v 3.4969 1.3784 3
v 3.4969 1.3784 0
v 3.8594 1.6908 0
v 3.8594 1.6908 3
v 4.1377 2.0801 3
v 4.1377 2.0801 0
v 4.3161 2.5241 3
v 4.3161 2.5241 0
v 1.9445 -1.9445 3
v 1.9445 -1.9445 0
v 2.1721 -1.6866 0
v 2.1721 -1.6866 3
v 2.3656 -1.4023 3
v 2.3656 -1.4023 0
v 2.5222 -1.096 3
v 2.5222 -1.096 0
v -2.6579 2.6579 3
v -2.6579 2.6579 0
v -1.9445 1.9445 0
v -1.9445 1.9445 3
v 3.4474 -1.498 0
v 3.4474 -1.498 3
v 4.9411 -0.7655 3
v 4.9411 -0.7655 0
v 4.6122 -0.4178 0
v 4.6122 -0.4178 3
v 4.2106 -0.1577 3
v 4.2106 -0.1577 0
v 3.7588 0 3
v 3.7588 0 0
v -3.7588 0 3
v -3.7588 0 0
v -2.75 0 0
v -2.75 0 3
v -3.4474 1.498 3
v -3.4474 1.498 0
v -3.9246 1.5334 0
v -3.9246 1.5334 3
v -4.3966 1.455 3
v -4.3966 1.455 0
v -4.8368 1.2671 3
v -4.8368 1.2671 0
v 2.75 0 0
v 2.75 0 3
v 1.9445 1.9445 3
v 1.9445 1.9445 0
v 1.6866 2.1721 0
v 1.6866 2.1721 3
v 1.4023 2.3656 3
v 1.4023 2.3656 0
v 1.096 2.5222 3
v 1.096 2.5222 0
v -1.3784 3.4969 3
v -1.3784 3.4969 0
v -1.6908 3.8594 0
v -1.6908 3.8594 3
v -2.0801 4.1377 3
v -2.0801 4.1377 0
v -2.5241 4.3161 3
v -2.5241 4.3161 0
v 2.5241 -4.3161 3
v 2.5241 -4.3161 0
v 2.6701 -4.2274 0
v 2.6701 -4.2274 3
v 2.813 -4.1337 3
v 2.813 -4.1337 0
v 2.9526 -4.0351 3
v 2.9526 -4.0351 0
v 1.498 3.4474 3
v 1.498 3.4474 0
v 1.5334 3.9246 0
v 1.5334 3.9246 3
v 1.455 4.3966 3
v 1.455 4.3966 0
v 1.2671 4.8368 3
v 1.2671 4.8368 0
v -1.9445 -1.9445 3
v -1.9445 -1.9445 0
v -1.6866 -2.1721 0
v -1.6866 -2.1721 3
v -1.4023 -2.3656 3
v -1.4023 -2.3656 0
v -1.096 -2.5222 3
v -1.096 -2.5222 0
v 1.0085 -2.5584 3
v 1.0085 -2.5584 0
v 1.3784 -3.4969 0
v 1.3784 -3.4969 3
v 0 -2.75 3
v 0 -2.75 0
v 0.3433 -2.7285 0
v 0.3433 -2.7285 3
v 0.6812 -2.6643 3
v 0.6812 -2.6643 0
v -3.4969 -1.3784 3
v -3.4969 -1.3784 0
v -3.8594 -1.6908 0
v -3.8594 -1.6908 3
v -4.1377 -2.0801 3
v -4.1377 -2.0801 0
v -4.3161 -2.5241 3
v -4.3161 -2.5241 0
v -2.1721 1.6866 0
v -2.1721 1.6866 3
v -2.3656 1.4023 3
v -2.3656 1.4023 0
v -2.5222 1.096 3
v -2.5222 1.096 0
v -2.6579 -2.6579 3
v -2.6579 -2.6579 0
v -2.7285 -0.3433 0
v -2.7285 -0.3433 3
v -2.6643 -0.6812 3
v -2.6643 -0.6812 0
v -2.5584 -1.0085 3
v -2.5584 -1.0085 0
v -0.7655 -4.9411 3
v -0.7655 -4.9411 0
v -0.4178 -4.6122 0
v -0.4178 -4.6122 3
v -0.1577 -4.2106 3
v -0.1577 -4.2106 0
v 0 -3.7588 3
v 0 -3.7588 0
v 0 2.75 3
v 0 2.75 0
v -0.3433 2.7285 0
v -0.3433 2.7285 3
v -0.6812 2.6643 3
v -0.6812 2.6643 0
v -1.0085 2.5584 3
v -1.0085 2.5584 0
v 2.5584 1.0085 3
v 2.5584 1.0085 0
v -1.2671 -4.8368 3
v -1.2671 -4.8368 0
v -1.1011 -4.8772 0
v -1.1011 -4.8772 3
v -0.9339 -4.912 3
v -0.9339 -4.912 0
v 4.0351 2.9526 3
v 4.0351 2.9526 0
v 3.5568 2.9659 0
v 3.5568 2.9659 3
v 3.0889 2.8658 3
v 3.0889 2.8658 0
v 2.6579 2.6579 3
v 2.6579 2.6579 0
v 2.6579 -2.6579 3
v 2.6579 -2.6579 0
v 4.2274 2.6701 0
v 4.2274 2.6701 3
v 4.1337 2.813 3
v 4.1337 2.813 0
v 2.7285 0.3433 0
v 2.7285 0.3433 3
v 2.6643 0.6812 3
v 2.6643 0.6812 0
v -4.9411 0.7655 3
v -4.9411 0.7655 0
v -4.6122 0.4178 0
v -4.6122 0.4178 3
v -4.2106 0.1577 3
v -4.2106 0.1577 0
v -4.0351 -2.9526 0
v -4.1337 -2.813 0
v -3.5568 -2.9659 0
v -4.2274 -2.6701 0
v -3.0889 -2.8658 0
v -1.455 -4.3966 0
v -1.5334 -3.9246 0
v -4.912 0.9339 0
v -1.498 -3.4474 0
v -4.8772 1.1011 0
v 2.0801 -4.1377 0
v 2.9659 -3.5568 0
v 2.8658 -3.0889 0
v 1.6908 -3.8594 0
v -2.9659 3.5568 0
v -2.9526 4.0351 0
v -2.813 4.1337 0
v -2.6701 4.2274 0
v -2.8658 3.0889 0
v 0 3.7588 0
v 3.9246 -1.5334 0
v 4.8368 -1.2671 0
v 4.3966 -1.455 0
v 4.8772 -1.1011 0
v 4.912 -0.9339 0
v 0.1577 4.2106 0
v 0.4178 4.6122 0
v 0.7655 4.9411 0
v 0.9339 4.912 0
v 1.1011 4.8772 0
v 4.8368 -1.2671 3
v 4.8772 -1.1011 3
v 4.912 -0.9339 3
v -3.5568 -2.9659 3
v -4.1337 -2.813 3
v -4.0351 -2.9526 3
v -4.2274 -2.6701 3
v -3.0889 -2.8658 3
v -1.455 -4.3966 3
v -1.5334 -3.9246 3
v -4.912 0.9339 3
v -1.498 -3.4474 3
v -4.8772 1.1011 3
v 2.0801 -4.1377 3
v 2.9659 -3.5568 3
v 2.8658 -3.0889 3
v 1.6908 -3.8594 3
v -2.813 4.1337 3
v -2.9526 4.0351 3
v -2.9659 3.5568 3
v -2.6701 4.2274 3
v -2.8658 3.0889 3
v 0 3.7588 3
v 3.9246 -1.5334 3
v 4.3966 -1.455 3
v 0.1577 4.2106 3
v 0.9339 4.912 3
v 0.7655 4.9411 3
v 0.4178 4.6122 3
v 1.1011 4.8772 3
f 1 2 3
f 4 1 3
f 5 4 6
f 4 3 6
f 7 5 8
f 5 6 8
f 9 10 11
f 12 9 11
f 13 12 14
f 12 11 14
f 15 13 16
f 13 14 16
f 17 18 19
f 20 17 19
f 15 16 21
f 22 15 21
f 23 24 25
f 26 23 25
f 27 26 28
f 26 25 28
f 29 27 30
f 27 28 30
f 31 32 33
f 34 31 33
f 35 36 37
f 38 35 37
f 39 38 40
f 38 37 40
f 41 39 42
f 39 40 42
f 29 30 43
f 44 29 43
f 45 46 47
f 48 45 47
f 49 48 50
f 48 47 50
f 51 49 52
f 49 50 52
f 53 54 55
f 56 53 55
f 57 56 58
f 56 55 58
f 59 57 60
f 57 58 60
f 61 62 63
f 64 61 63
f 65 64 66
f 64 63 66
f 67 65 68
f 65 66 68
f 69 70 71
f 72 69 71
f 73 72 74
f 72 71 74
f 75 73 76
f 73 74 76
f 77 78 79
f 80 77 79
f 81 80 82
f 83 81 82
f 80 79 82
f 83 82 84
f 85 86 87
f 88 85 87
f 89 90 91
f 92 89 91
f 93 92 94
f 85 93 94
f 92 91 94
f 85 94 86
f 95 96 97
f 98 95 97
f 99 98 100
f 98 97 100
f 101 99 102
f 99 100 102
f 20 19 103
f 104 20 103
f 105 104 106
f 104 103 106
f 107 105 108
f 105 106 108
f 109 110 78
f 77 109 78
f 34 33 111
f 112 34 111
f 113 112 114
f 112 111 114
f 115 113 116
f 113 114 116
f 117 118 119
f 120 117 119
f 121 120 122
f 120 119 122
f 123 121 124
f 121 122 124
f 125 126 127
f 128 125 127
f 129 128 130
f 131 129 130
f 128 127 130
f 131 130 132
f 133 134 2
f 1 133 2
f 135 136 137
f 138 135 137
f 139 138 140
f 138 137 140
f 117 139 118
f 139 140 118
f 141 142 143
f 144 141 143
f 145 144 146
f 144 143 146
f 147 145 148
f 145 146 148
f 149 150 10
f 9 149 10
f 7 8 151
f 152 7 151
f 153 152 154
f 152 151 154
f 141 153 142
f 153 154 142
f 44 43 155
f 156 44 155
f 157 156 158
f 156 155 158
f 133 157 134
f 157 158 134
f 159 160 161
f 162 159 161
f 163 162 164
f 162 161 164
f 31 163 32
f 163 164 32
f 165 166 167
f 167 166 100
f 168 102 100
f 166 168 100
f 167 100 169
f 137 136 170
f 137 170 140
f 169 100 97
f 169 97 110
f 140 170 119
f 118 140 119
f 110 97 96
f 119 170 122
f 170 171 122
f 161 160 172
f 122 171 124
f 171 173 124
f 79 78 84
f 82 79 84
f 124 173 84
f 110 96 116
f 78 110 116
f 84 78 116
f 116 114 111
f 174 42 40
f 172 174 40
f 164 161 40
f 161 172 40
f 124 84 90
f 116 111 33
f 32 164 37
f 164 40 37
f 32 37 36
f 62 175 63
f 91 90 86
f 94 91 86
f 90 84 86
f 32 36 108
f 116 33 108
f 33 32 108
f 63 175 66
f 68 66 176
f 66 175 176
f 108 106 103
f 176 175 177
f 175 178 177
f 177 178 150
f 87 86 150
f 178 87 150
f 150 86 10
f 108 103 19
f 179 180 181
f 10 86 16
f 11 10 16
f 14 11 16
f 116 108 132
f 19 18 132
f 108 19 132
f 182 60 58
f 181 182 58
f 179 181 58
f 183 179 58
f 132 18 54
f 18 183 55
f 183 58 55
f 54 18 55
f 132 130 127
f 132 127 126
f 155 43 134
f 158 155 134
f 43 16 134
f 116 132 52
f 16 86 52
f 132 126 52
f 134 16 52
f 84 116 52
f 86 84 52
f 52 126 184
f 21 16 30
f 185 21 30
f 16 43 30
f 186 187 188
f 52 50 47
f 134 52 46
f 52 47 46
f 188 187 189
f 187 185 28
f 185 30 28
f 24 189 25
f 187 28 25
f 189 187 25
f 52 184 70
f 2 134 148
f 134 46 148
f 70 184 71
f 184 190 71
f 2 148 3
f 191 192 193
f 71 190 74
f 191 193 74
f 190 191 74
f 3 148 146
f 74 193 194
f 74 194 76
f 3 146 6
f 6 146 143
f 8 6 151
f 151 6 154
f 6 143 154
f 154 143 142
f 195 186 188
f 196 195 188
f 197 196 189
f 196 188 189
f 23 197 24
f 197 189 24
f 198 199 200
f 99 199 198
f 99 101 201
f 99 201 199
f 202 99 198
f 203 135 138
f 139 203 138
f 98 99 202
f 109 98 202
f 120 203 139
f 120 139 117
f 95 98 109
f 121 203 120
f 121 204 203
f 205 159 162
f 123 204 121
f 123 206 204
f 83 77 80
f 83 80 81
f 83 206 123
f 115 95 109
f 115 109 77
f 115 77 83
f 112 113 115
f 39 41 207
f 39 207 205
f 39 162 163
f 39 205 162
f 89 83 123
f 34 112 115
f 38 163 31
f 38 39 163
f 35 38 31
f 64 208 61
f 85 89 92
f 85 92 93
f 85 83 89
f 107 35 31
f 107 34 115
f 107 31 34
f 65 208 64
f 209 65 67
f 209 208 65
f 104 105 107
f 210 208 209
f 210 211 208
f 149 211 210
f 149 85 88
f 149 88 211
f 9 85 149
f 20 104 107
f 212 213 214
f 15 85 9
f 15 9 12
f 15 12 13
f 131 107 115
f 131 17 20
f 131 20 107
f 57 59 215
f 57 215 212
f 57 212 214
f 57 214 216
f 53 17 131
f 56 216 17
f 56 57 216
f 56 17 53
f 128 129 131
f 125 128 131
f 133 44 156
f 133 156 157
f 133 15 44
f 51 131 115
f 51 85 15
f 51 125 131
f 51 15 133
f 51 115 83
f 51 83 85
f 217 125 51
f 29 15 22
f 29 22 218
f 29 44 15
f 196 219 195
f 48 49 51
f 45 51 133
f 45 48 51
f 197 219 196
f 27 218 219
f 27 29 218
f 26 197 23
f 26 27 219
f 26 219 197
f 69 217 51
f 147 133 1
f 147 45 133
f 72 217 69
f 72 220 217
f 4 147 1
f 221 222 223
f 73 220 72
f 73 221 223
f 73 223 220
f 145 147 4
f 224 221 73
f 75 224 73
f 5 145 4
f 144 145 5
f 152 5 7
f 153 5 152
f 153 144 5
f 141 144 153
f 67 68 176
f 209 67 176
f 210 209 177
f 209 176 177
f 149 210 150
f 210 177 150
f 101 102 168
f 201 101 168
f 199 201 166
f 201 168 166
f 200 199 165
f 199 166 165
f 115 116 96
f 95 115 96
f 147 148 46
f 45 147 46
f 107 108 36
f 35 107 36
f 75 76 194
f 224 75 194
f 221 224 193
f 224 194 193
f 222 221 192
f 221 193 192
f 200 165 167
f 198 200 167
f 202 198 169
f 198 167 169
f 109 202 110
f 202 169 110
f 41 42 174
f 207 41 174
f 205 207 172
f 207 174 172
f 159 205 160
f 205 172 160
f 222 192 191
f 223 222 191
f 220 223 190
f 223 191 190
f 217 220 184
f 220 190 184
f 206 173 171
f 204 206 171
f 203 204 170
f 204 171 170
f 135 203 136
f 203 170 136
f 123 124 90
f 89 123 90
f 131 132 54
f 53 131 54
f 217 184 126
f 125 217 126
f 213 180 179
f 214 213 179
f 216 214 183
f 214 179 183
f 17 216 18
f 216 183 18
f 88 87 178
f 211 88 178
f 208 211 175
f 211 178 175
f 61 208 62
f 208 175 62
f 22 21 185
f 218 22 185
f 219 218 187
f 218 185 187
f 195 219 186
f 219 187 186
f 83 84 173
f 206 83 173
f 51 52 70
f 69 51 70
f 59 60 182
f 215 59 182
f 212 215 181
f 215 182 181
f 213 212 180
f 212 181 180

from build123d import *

# Parameters (mm, degrees)
BOSS_EXTRU_1_DEPTH           = 3
R_P_TITION_CIRCULAIRE2_COUNT = 8
ESQUISSE5_R                  = 2.75
BOSS_EXTRU_2_DEPTH           = 3


with BuildPart() as part:
    # Esquisse4 → Boss.-Extru.1 (new body)
    with BuildSketch(Plane.XY):
        with BuildLine():
            Line((0, 3.758770483), (0, 2.75))
            ThreePointArc((0, 2.75), (0.559711277, 2.692438168), (1.095991276, 2.52216239))
            Line((1.095991276, 2.52216239), (1.498028967, 3.447356198))
            ThreePointArc((1.498028967, 3.447356198), (1.508290586, 4.162952408), (1.26714265, 4.836770566))
            ThreePointArc((1.26714265, 4.836770566), (1.017656867, 4.895342123), (0.765497749, 4.941053855))
            ThreePointArc((0.765497749, 4.941053855), (0.275783903, 4.419169208), (0, 3.758770483))
        make_face()
    extrude(amount=BOSS_EXTRU_1_DEPTH)


with BuildPart() as r_p_tition_circulaire2_1:
    # Répétition circulaire2: pattern copy
    add(part.part.rotate(Axis((0, 0, 0), (0, 0, 1)), 1 * 360 / R_P_TITION_CIRCULAIRE2_COUNT))


with BuildPart() as r_p_tition_circulaire2_2:
    # Répétition circulaire2: pattern copy
    add(part.part.rotate(Axis((0, 0, 0), (0, 0, 1)), 2 * 360 / R_P_TITION_CIRCULAIRE2_COUNT))


with BuildPart() as r_p_tition_circulaire2_3:
    # Répétition circulaire2: pattern copy
    add(part.part.rotate(Axis((0, 0, 0), (0, 0, 1)), 3 * 360 / R_P_TITION_CIRCULAIRE2_COUNT))


with BuildPart() as r_p_tition_circulaire2_4:
    # Répétition circulaire2: pattern copy
    add(part.part.rotate(Axis((0, 0, 0), (0, 0, 1)), 4 * 360 / R_P_TITION_CIRCULAIRE2_COUNT))


with BuildPart() as r_p_tition_circulaire2_5:
    # Répétition circulaire2: pattern copy
    add(part.part.rotate(Axis((0, 0, 0), (0, 0, 1)), 5 * 360 / R_P_TITION_CIRCULAIRE2_COUNT))


with BuildPart() as r_p_tition_circulaire2_6:
    # Répétition circulaire2: pattern copy
    add(part.part.rotate(Axis((0, 0, 0), (0, 0, 1)), 6 * 360 / R_P_TITION_CIRCULAIRE2_COUNT))


with BuildPart() as r_p_tition_circulaire2_7:
    # Répétition circulaire2: pattern copy
    add(part.part.rotate(Axis((0, 0, 0), (0, 0, 1)), 7 * 360 / R_P_TITION_CIRCULAIRE2_COUNT))


with BuildPart() as part_1:
    add(part.part)

    add(r_p_tition_circulaire2_1.part)  # Boss.-Extru.2 merges Répétition circulaire2_1

    add(r_p_tition_circulaire2_2.part)  # Boss.-Extru.2 merges Répétition circulaire2_2

    add(r_p_tition_circulaire2_3.part)  # Boss.-Extru.2 merges Répétition circulaire2_3

    add(r_p_tition_circulaire2_4.part)  # Boss.-Extru.2 merges Répétition circulaire2_4

    add(r_p_tition_circulaire2_5.part)  # Boss.-Extru.2 merges Répétition circulaire2_5

    add(r_p_tition_circulaire2_6.part)  # Boss.-Extru.2 merges Répétition circulaire2_6

    add(r_p_tition_circulaire2_7.part)  # Boss.-Extru.2 merges Répétition circulaire2_7
    # Esquisse5 → Boss.-Extru.2 (add)
    with BuildSketch(Plane.XY):
        Circle(ESQUISSE5_R)
    extrude(amount=BOSS_EXTRU_2_DEPTH)


solid = part_1.part
